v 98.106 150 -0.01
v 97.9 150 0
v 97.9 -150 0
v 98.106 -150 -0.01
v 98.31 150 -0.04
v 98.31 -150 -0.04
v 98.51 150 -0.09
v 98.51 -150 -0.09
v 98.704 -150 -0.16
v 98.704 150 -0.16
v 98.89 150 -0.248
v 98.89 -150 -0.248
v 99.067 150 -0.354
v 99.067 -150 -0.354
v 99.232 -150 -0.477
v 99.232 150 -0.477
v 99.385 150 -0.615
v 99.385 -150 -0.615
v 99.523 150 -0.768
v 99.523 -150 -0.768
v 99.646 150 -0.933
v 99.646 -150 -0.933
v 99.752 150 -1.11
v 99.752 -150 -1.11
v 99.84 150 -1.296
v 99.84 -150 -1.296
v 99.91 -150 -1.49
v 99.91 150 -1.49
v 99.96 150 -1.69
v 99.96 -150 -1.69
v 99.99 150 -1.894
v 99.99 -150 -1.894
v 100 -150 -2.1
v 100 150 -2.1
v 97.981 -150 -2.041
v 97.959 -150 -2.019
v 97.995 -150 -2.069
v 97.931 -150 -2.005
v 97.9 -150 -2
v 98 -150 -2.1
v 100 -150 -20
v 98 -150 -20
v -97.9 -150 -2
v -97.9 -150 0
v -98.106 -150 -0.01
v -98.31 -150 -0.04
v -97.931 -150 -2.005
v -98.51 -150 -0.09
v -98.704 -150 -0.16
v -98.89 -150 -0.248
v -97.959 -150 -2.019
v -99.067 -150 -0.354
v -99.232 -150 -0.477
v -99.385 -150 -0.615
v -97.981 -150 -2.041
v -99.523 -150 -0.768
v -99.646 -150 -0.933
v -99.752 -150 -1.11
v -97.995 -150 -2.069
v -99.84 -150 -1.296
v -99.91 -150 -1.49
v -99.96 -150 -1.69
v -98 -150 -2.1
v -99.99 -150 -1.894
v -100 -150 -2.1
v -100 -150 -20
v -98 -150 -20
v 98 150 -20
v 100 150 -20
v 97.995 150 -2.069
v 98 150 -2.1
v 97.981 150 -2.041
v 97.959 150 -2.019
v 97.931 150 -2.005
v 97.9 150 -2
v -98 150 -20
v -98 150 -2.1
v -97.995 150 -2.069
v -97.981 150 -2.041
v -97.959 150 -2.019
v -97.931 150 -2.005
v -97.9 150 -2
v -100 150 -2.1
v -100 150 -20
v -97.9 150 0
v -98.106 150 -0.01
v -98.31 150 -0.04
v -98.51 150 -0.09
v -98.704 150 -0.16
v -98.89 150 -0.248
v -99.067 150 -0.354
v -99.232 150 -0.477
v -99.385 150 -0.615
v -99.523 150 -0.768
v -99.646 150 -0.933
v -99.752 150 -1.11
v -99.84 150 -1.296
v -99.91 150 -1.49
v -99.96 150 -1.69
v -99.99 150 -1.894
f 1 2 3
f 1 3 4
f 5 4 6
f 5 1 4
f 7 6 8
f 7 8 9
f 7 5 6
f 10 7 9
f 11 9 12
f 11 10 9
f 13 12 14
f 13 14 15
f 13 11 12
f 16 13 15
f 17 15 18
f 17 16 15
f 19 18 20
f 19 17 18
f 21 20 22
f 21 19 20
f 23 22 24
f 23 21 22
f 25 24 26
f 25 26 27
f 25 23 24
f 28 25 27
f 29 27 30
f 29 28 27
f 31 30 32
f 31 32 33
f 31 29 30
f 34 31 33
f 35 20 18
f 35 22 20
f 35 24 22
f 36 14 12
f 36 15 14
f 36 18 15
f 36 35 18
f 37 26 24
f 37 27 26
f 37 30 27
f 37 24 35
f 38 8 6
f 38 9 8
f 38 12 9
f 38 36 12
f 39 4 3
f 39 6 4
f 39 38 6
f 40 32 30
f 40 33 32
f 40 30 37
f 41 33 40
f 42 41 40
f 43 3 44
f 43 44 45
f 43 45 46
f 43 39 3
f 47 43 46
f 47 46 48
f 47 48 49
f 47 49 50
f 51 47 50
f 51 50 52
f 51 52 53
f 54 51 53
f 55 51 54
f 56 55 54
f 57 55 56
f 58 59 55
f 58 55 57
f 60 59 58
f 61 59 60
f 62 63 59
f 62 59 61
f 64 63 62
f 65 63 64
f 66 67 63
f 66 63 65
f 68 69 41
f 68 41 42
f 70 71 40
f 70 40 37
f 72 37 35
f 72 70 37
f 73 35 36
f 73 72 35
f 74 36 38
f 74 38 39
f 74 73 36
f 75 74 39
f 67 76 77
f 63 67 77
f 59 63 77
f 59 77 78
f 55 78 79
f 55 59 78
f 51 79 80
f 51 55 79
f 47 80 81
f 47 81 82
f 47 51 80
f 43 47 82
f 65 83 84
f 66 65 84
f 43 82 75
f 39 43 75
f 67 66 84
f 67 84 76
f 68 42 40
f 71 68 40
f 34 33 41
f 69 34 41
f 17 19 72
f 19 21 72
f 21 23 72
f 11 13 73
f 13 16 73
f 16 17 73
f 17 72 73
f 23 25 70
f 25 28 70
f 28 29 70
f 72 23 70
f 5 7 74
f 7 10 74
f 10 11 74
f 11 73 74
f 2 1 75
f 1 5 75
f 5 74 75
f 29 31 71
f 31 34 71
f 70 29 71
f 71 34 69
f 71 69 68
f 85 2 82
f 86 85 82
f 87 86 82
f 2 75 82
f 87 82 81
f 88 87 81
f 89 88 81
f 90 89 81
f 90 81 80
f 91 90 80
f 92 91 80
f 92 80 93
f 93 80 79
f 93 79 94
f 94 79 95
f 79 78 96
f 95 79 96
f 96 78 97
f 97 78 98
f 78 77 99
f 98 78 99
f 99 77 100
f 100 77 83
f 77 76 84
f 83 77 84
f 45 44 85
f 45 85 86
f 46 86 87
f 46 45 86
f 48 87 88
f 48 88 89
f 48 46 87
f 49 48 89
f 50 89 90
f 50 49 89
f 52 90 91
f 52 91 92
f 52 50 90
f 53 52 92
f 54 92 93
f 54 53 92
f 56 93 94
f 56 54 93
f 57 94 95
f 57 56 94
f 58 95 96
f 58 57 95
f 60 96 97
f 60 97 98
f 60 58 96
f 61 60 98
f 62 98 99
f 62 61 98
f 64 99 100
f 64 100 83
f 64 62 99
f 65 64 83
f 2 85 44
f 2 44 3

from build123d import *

# Parameters (mm, degrees)
SKETCH_1_W                         = 200
SKETCH_1_H                         = 300
SM_BASE_FLANGE_1_DEPTH             = 2
SM_EDGE_FLANGE_1_STRIP_W           = 8.2
SM_EDGE_FLANGE_1_STRIP_H           = 2
SM_EDGE_FLANGE_1_STRIP_CUT_DEPTH   = 300
SM_EDGE_FLANGE_1_STRIP_2_W         = 8.2
SM_EDGE_FLANGE_1_STRIP_2_H         = 2
SM_EDGE_FLANGE_1_STRIP_CUT_2_DEPTH = 300
SM_EDGE_FLANGE_1_DEPTH             = 300
SM_EDGE_FLANGE_1_BEND_DEPTH        = 300


# Sheet-metal steps are written as plain solids
with BuildPart() as part:
    # Sketch 1 → 基体-法兰1 (new body)
    with BuildSketch(Plane.XY):
        Rectangle(SKETCH_1_W, SKETCH_1_H)
    extrude(amount=-SM_BASE_FLANGE_1_DEPTH)

    # 边线-法兰1 strip (across the edge) → 边线-法兰1 strip cut (cut)
    with BuildSketch(Plane(origin=(100, 150, -2), x_dir=(-1, 0, 0), z_dir=(0, -1, 0))):
        with Locations((-2, -1)):
            Rectangle(SM_EDGE_FLANGE_1_STRIP_W, SM_EDGE_FLANGE_1_STRIP_H)
    extrude(amount=SM_EDGE_FLANGE_1_STRIP_CUT_DEPTH, mode=Mode.SUBTRACT)

    # 边线-法兰1 strip 2 (across the edge) → 边线-法兰1 strip cut 2 (cut)
    with BuildSketch(Plane(origin=(-100, -150, -2), x_dir=(1, 0, 0), z_dir=(0, 1, 0))):
        with Locations((-2, -1)):
            Rectangle(SM_EDGE_FLANGE_1_STRIP_2_W, SM_EDGE_FLANGE_1_STRIP_2_H)
    extrude(amount=SM_EDGE_FLANGE_1_STRIP_CUT_2_DEPTH, mode=Mode.SUBTRACT)

    # 边线-法兰1 section (across the edge) → 边线-法兰1 (add)
    with BuildSketch(Plane(origin=(100, 150, -2), x_dir=(-1, 0, 0), z_dir=(0, -1, 0))):
        with BuildLine():
            Line((0, 0.1), (0, 18))
            Line((0, 18), (2, 18))
            Line((2, 18), (2, 0.1))
            ThreePointArc((2, 0.1), (2.029289322, 0.029289322), (2.1, 0))
            Line((2.1, 0), (2.1, -2))
            ThreePointArc((2.1, -2), (0.61507576, -1.38492424), (0, 0.1))
        make_face()
    extrude(amount=SM_EDGE_FLANGE_1_DEPTH)

    # 边线-法兰1 section 2 (across the edge) → 边线-法兰1 bend (add)
    with BuildSketch(Plane(origin=(-100, -150, -2), x_dir=(1, 0, 0), z_dir=(0, 1, 0))):
        with BuildLine():
            Line((0, 0.1), (0, 18))
            Line((0, 18), (2, 18))
            Line((2, 18), (2, 0.1))
            ThreePointArc((2, 0.1), (2.029289322, 0.029289322), (2.1, 0))
            Line((2.1, 0), (2.1, -2))
            ThreePointArc((2.1, -2), (0.61507576, -1.38492424), (0, 0.1))
        make_face()
    extrude(amount=SM_EDGE_FLANGE_1_BEND_DEPTH)


solid = part.part
